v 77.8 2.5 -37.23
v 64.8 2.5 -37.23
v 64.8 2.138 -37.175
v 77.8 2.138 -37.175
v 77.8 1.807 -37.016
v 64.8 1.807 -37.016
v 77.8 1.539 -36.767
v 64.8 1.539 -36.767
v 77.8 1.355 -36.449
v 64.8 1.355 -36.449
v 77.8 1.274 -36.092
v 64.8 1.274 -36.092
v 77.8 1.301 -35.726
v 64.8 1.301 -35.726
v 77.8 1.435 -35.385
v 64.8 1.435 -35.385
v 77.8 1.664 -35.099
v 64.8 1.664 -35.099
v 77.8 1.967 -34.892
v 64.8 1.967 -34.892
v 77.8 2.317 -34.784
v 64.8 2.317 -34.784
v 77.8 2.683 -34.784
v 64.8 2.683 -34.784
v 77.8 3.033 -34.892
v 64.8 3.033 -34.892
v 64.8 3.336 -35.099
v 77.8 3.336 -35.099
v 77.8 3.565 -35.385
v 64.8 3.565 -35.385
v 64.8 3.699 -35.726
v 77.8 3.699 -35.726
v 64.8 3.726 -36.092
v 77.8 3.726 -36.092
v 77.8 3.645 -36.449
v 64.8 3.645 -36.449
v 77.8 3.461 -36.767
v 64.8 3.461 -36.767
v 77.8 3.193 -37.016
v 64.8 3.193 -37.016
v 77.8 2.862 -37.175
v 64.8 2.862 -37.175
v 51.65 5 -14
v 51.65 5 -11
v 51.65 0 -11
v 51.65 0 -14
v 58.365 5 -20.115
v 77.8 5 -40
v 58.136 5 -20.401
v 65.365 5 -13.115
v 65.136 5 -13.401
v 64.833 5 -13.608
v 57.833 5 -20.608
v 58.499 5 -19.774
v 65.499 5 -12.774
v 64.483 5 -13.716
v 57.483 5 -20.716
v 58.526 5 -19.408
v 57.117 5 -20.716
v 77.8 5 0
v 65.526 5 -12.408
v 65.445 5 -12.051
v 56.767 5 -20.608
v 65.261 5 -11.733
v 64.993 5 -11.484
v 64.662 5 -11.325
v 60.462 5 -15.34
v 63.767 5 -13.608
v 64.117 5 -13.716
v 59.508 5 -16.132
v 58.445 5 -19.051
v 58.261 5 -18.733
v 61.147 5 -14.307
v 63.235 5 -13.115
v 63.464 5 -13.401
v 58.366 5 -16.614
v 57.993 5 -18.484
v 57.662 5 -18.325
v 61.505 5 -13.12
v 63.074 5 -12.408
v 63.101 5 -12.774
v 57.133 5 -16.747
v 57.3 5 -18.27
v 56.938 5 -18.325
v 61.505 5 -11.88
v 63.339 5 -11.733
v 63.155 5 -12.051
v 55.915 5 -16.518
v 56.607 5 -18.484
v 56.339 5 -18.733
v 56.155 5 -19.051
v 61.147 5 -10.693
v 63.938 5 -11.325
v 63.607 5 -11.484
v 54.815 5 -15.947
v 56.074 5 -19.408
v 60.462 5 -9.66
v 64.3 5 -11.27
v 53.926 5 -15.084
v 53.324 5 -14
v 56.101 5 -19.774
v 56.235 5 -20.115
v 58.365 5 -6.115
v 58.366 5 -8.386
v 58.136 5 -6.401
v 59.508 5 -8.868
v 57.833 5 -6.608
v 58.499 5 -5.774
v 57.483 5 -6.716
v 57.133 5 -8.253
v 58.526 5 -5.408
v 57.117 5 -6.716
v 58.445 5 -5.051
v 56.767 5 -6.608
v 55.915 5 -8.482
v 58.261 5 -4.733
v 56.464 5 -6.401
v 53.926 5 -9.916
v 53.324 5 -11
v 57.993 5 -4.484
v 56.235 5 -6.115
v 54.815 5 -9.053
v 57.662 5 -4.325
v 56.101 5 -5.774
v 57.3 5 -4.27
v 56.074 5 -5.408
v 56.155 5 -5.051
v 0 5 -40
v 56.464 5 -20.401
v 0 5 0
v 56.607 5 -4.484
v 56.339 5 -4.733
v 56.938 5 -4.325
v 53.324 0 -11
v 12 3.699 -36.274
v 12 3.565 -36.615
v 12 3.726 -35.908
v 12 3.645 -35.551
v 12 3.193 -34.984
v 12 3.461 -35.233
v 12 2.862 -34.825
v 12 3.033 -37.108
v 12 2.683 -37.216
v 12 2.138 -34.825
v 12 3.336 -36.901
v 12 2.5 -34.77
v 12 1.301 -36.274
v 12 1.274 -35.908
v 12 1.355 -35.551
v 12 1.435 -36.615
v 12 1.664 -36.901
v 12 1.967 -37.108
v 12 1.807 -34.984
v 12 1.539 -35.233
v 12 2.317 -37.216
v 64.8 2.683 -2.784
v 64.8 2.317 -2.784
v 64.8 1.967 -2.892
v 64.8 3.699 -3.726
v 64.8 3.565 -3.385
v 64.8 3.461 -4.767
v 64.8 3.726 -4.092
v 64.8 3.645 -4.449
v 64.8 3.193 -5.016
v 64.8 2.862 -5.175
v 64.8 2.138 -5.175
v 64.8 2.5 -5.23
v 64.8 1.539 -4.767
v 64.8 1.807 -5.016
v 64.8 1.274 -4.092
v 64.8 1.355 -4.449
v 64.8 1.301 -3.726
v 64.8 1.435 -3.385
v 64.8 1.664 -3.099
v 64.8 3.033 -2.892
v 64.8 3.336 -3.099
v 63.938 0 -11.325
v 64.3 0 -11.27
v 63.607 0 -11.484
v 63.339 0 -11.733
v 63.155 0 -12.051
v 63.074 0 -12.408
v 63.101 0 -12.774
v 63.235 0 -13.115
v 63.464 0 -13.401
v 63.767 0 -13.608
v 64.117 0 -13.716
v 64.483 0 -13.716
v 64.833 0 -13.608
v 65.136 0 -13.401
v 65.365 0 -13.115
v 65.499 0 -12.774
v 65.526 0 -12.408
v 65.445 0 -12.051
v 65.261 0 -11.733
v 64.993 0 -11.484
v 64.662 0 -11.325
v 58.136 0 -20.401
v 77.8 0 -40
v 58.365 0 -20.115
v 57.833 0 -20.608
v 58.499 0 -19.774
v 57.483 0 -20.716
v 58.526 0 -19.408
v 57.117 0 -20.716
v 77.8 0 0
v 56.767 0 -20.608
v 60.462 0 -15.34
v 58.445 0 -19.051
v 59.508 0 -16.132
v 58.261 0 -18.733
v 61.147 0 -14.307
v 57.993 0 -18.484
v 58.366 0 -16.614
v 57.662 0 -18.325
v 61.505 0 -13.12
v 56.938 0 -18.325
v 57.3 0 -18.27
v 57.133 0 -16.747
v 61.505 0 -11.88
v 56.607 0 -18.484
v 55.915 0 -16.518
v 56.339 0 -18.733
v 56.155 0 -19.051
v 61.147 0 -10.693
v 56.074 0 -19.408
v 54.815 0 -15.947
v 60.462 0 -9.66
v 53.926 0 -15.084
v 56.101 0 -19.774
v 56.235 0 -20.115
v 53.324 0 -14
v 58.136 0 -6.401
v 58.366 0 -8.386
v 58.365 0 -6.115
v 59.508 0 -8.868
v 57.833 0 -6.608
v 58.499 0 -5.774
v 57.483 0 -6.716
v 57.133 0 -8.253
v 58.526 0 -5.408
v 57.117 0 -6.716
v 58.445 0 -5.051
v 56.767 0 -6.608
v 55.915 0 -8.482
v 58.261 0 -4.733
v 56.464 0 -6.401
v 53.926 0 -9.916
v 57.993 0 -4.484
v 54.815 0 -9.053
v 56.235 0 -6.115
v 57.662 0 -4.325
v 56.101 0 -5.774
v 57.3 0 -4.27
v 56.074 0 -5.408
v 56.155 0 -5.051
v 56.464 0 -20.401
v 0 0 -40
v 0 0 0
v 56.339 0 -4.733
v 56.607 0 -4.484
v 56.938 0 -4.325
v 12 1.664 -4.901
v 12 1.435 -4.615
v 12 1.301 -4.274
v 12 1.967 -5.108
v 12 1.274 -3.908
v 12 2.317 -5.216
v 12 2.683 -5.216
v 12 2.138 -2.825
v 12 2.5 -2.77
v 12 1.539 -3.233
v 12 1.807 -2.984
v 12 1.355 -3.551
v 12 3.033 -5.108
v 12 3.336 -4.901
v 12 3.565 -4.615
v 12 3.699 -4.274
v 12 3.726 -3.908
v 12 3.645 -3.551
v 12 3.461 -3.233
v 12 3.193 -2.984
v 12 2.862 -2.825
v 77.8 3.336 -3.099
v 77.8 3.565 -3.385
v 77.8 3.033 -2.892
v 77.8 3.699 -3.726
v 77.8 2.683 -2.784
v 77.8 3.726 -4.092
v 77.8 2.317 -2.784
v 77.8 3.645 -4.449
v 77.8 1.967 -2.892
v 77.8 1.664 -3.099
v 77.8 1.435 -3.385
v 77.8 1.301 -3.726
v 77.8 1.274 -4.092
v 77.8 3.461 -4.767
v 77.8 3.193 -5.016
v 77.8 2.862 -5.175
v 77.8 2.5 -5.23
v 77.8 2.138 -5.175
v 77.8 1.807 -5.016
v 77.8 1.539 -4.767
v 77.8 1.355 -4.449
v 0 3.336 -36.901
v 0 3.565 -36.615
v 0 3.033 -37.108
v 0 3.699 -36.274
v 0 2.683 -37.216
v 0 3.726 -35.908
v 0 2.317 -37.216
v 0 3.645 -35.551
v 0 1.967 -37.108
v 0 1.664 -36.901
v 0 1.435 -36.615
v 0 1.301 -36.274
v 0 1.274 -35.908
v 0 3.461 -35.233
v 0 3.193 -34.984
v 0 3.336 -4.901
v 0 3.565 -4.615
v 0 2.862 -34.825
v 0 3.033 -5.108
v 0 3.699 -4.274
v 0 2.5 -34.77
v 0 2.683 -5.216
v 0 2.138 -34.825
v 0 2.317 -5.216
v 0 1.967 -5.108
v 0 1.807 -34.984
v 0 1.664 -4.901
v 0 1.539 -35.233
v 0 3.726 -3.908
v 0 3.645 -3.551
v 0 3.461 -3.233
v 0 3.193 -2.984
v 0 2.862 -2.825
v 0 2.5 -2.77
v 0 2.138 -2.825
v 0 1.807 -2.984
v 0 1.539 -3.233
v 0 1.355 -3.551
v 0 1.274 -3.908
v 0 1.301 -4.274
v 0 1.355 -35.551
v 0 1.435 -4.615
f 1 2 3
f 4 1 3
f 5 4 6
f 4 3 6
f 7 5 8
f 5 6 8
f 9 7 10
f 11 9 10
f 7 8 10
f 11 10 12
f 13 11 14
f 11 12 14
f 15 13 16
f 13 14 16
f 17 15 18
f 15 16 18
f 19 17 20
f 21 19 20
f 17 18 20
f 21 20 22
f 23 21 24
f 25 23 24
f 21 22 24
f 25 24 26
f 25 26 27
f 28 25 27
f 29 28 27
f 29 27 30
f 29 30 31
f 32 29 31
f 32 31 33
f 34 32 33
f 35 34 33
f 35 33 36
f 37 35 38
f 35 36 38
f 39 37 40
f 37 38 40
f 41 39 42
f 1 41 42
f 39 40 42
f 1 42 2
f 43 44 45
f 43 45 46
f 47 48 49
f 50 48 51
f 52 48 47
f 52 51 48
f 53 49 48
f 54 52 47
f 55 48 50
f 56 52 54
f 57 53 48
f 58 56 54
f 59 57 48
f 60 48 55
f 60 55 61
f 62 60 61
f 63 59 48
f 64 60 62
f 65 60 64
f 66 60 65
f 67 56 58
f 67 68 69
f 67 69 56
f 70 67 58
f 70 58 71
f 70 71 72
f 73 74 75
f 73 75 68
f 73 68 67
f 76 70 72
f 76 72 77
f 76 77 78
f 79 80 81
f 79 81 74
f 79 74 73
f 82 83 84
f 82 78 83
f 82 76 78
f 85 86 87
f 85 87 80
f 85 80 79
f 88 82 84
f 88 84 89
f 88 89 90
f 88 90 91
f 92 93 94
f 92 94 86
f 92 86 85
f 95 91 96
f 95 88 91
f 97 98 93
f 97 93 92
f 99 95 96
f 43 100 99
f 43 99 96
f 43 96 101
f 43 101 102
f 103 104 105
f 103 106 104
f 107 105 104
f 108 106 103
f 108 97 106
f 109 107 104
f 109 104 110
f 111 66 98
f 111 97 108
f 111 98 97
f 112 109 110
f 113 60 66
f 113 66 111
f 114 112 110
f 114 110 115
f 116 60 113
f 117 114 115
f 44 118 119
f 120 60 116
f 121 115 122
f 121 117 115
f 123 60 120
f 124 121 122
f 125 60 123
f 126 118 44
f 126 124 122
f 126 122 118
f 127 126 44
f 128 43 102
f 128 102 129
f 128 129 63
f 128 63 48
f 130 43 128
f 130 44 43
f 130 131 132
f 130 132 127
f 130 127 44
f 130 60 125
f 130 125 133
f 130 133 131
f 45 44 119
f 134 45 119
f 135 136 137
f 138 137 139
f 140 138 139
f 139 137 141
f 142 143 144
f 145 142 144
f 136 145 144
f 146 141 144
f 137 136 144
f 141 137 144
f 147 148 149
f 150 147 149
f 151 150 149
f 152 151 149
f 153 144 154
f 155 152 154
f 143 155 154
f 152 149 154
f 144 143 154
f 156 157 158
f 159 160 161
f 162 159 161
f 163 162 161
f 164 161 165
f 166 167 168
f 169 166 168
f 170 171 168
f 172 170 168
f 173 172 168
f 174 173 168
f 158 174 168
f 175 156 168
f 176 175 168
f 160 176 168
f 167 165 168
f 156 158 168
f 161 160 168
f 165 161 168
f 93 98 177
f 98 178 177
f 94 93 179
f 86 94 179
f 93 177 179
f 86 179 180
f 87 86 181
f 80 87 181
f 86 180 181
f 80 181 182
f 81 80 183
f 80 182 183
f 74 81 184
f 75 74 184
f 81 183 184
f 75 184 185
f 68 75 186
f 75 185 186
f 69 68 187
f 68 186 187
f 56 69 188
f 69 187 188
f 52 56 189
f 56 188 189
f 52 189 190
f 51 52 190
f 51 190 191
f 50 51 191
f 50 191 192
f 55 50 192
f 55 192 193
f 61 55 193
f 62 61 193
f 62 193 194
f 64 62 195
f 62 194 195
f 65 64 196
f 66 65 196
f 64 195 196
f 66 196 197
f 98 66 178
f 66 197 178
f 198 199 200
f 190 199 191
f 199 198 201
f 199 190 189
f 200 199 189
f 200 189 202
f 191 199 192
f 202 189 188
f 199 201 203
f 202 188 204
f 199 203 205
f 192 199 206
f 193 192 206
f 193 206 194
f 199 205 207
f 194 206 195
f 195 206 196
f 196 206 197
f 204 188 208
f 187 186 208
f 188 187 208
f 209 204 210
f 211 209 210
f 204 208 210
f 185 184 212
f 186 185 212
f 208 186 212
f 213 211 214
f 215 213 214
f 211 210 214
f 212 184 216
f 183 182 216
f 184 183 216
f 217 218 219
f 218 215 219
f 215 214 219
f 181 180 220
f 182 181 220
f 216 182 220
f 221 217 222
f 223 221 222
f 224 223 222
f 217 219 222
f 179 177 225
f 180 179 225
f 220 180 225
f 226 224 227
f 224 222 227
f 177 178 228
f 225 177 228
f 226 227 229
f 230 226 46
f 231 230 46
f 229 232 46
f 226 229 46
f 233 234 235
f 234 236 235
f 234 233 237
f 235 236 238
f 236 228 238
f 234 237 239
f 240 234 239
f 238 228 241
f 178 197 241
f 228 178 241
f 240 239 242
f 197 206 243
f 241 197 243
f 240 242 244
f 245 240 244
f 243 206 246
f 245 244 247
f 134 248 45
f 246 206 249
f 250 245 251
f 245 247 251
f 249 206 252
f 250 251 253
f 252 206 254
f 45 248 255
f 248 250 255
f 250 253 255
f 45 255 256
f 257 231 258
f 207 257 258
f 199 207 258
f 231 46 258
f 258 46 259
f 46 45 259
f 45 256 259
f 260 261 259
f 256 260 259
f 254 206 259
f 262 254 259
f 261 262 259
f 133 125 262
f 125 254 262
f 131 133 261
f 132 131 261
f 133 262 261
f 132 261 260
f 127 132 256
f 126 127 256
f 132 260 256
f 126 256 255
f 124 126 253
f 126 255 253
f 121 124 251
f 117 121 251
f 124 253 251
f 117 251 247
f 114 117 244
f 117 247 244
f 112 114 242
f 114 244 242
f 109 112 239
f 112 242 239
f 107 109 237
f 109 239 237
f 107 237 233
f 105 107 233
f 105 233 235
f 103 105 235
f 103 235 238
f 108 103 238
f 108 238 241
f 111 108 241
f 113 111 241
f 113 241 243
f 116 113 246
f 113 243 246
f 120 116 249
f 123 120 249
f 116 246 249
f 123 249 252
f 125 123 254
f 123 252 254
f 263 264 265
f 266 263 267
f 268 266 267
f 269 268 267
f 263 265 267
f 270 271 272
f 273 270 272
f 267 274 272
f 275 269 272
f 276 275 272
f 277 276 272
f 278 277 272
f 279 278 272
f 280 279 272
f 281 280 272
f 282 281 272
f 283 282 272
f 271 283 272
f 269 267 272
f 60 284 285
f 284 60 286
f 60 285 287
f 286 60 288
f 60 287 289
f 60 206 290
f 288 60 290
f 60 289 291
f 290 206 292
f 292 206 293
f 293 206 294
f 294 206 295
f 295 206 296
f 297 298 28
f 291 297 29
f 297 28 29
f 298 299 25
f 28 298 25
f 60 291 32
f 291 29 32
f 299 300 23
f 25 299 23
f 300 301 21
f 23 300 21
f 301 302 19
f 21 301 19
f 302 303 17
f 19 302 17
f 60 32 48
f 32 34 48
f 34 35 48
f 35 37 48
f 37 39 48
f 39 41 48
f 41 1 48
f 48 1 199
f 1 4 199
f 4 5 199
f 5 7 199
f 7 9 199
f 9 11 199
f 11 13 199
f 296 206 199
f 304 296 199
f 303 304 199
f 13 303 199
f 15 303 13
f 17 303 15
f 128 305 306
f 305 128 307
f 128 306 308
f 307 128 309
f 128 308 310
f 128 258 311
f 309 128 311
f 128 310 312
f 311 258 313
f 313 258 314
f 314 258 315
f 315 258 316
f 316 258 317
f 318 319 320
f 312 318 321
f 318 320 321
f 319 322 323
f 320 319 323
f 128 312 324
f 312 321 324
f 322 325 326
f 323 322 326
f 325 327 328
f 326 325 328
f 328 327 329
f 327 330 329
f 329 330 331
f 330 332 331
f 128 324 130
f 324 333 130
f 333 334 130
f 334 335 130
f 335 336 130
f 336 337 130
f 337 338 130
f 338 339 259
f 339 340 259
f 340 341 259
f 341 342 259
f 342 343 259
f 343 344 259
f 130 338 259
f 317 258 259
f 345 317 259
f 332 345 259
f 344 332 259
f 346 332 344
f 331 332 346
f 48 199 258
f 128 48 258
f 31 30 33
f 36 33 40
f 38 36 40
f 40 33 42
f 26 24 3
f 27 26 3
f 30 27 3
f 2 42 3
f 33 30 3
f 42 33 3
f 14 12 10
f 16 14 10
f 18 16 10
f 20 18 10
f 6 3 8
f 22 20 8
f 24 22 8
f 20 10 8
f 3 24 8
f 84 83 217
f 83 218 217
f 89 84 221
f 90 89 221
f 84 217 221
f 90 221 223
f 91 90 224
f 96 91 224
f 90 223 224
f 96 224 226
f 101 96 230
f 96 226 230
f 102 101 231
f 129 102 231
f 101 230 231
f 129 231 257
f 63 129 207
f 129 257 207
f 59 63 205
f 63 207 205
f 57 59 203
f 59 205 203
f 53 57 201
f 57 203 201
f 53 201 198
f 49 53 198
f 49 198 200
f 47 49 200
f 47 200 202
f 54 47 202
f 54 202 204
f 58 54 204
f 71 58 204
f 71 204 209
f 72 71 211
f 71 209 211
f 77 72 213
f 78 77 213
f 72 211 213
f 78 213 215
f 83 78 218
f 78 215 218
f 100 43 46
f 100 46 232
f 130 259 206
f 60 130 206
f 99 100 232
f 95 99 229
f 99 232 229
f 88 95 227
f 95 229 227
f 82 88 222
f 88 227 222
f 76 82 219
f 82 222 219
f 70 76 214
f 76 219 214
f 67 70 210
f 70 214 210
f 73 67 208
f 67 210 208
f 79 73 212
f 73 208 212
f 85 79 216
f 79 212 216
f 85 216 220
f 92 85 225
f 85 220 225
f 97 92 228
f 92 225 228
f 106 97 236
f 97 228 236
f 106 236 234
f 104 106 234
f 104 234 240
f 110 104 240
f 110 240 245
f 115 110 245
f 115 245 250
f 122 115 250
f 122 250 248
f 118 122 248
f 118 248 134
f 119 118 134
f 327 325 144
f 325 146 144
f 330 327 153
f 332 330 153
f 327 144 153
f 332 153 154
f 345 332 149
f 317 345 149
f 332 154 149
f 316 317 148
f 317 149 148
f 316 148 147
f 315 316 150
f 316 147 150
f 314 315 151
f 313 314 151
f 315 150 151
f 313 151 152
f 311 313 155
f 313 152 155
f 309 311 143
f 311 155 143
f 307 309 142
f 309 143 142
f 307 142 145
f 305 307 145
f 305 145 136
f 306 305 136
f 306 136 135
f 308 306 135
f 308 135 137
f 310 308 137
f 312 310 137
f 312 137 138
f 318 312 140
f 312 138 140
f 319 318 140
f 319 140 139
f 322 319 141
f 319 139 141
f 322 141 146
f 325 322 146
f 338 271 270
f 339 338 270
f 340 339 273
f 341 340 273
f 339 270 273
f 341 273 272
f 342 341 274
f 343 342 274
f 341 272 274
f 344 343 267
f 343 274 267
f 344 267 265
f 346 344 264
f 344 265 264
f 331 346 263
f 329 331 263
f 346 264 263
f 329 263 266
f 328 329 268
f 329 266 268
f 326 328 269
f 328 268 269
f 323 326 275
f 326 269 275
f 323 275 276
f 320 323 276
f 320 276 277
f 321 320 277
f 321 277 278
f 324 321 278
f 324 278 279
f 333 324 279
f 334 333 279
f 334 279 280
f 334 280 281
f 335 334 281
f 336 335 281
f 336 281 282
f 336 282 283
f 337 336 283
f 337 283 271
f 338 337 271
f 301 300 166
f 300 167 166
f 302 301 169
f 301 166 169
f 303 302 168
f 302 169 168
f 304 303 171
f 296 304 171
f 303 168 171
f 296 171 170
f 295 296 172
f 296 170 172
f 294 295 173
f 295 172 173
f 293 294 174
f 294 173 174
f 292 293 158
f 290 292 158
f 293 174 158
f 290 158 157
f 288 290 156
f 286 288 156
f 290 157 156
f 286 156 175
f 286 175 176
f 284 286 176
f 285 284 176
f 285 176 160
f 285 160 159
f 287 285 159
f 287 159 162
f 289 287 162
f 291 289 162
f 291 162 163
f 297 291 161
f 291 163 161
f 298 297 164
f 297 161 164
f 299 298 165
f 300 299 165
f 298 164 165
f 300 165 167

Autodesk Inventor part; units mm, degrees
ref_plane "YZ Plane" through (0, 0, 0) normal (1, 0, 0) x (0, 1, 0)
ref_plane "XZ Plane" through (0, 0, 0) normal (0, 1, 0) x (-1, 0, 0)
ref_plane "XY Plane" through (0, 0, 0) normal (0, 0, 1) x (1, 0, 0)
sketch "スケッチ2" plane through (0, 0, 0) normal (0, 1, 0) x (-1, 0, 0)
  line L0 (0, 0) -> (-77.8, 0)
  line L1 (-77.8, 0) -> (-77.8, -40)
  line L2 (-77.8, -40) -> (0, -40)
  line L3 (0, -40) -> (0, 0)
  dimension "d0" = 77.8
  dimension "d1" = 40
extrude "押し出し1" add sketch "スケッチ2" along normal blind 5
sketch "スケッチ4" plane through (0, 0, -40) normal (-1, 0, 0) x (0, 0, 1)
  line L0 (0, 0) -> (0, 5) construction
  line L1 (0, 2.5) -> (40, 2.5) construction
  line L2 (40, 0) -> (40, 5) construction
  point P0 (4, 2.5)
  point P1 (36, 2.5)
  dimension "d4" = 4
  dimension "d5" = 4
hole "穴1" at (0, 2.5, -36) at (0, 2.5, -4) direction (1, 0, 0) diameter 2.459 depth 12 thread size "M3x0.5" class "6H" standard "ISO Metric profile"
sketch "スケッチ5" plane through (77.8, 0, 0) normal (1, 0, 0) x (0, 0, -1)
  line L0 (0, 0) -> (0, 5) construction
  line L1 (0, 2.5) -> (39.9198, 2.5) construction
  circle A0 centre (4, 2.5) radius 1.2295 construction
  circle A1 centre (36, 2.5) radius 1.2295 projected
  point P0 (4, 2.5)
  point P1 (36, 2.5)
hole "穴2" at (77.8, 2.5, -4) at (77.8, 2.5, -36) direction (-1, 0, 0) diameter 2.459 depth 13 thread size "M3x0.5" class "6H" standard "ISO Metric profile"
sketch "スケッチ6" plane through (0, 5, 0) normal (0, 1, 0) x (1, 0, 0)
  line L0 (77.8, 0) -> (77.8, 40) construction
  line L1 (0, 40) -> (0, 0) construction
  line L2 (0, 0) -> (77.8, 0) construction
  point P0 (57.3, 12.5)
  dimension "d20" = 20.5
  dimension "d21" = 12.5
hole "穴3" at (57.3, 5, -12.5) direction (0, -1, 0) diameter 8.5 end through all
sketch "スケッチ7" plane through (0, 5, 0) normal (0, 1, 0) x (1, 0, 0)
  line L0 (77.8, 0) -> (77.8, 40) construction
  line L1 (77.8, 28.3) -> (0, 28.3) construction
  line L2 (0, 40) -> (0, 0) construction
  circle A0 centre (57.3, 12.5) radius 4.25 construction
  point P0 (67.8, 28.3)
  point P1 (46.8, 28.3)
  dimension "d29" = 15.8
  dimension "d30" = 10.5
  dimension "d31" = 10.5
hole "穴4" [suppressed]
sketch "スケッチ8" plane through (0, 5, 0) normal (0, 1, 0) x (1, 0, 0)
  circle A0 centre (57.3, 12.5) radius 4.25 construction
  circle A1 centre (57.3, 12.5) radius 7 construction
  point P0 (0, 0)
  point P1 (64.3, 12.5)
  point P2 (57.3, 19.5)
  point P3 (57.3, 5.5)
  dimension "d39" = 14
hole "穴5" at (64.3, 5, -12.5) at (57.3, 5, -19.5) at (57.3, 5, -5.5) direction (0, -1, 0) diameter 2.459 end through all thread size "M3x0.5" class "6H" standard "ISO Metric profile"
sketch "スケッチ9" plane through (0, 5, 0) normal (0, 1, 0) x (1, 0, 0)
  circle A0 centre (57.3, 12.5) radius 4.25 projected
  line L0 (57.3, 12.5) -> (45.9478, 12.5) construction
  line L1 (51.65, 14) -> (53.05, 14)
  line L2 (53.05, 14) -> (53.05, 11)
  line L3 (53.05, 11) -> (51.65, 11)
  line L4 (51.65, 11) -> (51.65, 14)
  line L5 (51.65, 14) -> (53.05, 11) construction
  line L6 (53.05, 14) -> (51.65, 11) construction
  line L7 (53.05, 11) -> (53.3235, 11)
  line L8 (53.05, 14) -> (53.3235, 14)
  point P0 (0, 0)
  point P1 (52.35, 12.5)
  dimension "d56" = 1.4
  dimension "d57" = 0
  dimension "d58" = 3
extrude "押し出し2" cut sketch "スケッチ9" against normal blind 10 contours A0 L2 L8 | L7 L2 A0 | L2 L3 L4 L1
properties part number "shoulder1_verticval_right_cover" material "アルミニウム 5052"
